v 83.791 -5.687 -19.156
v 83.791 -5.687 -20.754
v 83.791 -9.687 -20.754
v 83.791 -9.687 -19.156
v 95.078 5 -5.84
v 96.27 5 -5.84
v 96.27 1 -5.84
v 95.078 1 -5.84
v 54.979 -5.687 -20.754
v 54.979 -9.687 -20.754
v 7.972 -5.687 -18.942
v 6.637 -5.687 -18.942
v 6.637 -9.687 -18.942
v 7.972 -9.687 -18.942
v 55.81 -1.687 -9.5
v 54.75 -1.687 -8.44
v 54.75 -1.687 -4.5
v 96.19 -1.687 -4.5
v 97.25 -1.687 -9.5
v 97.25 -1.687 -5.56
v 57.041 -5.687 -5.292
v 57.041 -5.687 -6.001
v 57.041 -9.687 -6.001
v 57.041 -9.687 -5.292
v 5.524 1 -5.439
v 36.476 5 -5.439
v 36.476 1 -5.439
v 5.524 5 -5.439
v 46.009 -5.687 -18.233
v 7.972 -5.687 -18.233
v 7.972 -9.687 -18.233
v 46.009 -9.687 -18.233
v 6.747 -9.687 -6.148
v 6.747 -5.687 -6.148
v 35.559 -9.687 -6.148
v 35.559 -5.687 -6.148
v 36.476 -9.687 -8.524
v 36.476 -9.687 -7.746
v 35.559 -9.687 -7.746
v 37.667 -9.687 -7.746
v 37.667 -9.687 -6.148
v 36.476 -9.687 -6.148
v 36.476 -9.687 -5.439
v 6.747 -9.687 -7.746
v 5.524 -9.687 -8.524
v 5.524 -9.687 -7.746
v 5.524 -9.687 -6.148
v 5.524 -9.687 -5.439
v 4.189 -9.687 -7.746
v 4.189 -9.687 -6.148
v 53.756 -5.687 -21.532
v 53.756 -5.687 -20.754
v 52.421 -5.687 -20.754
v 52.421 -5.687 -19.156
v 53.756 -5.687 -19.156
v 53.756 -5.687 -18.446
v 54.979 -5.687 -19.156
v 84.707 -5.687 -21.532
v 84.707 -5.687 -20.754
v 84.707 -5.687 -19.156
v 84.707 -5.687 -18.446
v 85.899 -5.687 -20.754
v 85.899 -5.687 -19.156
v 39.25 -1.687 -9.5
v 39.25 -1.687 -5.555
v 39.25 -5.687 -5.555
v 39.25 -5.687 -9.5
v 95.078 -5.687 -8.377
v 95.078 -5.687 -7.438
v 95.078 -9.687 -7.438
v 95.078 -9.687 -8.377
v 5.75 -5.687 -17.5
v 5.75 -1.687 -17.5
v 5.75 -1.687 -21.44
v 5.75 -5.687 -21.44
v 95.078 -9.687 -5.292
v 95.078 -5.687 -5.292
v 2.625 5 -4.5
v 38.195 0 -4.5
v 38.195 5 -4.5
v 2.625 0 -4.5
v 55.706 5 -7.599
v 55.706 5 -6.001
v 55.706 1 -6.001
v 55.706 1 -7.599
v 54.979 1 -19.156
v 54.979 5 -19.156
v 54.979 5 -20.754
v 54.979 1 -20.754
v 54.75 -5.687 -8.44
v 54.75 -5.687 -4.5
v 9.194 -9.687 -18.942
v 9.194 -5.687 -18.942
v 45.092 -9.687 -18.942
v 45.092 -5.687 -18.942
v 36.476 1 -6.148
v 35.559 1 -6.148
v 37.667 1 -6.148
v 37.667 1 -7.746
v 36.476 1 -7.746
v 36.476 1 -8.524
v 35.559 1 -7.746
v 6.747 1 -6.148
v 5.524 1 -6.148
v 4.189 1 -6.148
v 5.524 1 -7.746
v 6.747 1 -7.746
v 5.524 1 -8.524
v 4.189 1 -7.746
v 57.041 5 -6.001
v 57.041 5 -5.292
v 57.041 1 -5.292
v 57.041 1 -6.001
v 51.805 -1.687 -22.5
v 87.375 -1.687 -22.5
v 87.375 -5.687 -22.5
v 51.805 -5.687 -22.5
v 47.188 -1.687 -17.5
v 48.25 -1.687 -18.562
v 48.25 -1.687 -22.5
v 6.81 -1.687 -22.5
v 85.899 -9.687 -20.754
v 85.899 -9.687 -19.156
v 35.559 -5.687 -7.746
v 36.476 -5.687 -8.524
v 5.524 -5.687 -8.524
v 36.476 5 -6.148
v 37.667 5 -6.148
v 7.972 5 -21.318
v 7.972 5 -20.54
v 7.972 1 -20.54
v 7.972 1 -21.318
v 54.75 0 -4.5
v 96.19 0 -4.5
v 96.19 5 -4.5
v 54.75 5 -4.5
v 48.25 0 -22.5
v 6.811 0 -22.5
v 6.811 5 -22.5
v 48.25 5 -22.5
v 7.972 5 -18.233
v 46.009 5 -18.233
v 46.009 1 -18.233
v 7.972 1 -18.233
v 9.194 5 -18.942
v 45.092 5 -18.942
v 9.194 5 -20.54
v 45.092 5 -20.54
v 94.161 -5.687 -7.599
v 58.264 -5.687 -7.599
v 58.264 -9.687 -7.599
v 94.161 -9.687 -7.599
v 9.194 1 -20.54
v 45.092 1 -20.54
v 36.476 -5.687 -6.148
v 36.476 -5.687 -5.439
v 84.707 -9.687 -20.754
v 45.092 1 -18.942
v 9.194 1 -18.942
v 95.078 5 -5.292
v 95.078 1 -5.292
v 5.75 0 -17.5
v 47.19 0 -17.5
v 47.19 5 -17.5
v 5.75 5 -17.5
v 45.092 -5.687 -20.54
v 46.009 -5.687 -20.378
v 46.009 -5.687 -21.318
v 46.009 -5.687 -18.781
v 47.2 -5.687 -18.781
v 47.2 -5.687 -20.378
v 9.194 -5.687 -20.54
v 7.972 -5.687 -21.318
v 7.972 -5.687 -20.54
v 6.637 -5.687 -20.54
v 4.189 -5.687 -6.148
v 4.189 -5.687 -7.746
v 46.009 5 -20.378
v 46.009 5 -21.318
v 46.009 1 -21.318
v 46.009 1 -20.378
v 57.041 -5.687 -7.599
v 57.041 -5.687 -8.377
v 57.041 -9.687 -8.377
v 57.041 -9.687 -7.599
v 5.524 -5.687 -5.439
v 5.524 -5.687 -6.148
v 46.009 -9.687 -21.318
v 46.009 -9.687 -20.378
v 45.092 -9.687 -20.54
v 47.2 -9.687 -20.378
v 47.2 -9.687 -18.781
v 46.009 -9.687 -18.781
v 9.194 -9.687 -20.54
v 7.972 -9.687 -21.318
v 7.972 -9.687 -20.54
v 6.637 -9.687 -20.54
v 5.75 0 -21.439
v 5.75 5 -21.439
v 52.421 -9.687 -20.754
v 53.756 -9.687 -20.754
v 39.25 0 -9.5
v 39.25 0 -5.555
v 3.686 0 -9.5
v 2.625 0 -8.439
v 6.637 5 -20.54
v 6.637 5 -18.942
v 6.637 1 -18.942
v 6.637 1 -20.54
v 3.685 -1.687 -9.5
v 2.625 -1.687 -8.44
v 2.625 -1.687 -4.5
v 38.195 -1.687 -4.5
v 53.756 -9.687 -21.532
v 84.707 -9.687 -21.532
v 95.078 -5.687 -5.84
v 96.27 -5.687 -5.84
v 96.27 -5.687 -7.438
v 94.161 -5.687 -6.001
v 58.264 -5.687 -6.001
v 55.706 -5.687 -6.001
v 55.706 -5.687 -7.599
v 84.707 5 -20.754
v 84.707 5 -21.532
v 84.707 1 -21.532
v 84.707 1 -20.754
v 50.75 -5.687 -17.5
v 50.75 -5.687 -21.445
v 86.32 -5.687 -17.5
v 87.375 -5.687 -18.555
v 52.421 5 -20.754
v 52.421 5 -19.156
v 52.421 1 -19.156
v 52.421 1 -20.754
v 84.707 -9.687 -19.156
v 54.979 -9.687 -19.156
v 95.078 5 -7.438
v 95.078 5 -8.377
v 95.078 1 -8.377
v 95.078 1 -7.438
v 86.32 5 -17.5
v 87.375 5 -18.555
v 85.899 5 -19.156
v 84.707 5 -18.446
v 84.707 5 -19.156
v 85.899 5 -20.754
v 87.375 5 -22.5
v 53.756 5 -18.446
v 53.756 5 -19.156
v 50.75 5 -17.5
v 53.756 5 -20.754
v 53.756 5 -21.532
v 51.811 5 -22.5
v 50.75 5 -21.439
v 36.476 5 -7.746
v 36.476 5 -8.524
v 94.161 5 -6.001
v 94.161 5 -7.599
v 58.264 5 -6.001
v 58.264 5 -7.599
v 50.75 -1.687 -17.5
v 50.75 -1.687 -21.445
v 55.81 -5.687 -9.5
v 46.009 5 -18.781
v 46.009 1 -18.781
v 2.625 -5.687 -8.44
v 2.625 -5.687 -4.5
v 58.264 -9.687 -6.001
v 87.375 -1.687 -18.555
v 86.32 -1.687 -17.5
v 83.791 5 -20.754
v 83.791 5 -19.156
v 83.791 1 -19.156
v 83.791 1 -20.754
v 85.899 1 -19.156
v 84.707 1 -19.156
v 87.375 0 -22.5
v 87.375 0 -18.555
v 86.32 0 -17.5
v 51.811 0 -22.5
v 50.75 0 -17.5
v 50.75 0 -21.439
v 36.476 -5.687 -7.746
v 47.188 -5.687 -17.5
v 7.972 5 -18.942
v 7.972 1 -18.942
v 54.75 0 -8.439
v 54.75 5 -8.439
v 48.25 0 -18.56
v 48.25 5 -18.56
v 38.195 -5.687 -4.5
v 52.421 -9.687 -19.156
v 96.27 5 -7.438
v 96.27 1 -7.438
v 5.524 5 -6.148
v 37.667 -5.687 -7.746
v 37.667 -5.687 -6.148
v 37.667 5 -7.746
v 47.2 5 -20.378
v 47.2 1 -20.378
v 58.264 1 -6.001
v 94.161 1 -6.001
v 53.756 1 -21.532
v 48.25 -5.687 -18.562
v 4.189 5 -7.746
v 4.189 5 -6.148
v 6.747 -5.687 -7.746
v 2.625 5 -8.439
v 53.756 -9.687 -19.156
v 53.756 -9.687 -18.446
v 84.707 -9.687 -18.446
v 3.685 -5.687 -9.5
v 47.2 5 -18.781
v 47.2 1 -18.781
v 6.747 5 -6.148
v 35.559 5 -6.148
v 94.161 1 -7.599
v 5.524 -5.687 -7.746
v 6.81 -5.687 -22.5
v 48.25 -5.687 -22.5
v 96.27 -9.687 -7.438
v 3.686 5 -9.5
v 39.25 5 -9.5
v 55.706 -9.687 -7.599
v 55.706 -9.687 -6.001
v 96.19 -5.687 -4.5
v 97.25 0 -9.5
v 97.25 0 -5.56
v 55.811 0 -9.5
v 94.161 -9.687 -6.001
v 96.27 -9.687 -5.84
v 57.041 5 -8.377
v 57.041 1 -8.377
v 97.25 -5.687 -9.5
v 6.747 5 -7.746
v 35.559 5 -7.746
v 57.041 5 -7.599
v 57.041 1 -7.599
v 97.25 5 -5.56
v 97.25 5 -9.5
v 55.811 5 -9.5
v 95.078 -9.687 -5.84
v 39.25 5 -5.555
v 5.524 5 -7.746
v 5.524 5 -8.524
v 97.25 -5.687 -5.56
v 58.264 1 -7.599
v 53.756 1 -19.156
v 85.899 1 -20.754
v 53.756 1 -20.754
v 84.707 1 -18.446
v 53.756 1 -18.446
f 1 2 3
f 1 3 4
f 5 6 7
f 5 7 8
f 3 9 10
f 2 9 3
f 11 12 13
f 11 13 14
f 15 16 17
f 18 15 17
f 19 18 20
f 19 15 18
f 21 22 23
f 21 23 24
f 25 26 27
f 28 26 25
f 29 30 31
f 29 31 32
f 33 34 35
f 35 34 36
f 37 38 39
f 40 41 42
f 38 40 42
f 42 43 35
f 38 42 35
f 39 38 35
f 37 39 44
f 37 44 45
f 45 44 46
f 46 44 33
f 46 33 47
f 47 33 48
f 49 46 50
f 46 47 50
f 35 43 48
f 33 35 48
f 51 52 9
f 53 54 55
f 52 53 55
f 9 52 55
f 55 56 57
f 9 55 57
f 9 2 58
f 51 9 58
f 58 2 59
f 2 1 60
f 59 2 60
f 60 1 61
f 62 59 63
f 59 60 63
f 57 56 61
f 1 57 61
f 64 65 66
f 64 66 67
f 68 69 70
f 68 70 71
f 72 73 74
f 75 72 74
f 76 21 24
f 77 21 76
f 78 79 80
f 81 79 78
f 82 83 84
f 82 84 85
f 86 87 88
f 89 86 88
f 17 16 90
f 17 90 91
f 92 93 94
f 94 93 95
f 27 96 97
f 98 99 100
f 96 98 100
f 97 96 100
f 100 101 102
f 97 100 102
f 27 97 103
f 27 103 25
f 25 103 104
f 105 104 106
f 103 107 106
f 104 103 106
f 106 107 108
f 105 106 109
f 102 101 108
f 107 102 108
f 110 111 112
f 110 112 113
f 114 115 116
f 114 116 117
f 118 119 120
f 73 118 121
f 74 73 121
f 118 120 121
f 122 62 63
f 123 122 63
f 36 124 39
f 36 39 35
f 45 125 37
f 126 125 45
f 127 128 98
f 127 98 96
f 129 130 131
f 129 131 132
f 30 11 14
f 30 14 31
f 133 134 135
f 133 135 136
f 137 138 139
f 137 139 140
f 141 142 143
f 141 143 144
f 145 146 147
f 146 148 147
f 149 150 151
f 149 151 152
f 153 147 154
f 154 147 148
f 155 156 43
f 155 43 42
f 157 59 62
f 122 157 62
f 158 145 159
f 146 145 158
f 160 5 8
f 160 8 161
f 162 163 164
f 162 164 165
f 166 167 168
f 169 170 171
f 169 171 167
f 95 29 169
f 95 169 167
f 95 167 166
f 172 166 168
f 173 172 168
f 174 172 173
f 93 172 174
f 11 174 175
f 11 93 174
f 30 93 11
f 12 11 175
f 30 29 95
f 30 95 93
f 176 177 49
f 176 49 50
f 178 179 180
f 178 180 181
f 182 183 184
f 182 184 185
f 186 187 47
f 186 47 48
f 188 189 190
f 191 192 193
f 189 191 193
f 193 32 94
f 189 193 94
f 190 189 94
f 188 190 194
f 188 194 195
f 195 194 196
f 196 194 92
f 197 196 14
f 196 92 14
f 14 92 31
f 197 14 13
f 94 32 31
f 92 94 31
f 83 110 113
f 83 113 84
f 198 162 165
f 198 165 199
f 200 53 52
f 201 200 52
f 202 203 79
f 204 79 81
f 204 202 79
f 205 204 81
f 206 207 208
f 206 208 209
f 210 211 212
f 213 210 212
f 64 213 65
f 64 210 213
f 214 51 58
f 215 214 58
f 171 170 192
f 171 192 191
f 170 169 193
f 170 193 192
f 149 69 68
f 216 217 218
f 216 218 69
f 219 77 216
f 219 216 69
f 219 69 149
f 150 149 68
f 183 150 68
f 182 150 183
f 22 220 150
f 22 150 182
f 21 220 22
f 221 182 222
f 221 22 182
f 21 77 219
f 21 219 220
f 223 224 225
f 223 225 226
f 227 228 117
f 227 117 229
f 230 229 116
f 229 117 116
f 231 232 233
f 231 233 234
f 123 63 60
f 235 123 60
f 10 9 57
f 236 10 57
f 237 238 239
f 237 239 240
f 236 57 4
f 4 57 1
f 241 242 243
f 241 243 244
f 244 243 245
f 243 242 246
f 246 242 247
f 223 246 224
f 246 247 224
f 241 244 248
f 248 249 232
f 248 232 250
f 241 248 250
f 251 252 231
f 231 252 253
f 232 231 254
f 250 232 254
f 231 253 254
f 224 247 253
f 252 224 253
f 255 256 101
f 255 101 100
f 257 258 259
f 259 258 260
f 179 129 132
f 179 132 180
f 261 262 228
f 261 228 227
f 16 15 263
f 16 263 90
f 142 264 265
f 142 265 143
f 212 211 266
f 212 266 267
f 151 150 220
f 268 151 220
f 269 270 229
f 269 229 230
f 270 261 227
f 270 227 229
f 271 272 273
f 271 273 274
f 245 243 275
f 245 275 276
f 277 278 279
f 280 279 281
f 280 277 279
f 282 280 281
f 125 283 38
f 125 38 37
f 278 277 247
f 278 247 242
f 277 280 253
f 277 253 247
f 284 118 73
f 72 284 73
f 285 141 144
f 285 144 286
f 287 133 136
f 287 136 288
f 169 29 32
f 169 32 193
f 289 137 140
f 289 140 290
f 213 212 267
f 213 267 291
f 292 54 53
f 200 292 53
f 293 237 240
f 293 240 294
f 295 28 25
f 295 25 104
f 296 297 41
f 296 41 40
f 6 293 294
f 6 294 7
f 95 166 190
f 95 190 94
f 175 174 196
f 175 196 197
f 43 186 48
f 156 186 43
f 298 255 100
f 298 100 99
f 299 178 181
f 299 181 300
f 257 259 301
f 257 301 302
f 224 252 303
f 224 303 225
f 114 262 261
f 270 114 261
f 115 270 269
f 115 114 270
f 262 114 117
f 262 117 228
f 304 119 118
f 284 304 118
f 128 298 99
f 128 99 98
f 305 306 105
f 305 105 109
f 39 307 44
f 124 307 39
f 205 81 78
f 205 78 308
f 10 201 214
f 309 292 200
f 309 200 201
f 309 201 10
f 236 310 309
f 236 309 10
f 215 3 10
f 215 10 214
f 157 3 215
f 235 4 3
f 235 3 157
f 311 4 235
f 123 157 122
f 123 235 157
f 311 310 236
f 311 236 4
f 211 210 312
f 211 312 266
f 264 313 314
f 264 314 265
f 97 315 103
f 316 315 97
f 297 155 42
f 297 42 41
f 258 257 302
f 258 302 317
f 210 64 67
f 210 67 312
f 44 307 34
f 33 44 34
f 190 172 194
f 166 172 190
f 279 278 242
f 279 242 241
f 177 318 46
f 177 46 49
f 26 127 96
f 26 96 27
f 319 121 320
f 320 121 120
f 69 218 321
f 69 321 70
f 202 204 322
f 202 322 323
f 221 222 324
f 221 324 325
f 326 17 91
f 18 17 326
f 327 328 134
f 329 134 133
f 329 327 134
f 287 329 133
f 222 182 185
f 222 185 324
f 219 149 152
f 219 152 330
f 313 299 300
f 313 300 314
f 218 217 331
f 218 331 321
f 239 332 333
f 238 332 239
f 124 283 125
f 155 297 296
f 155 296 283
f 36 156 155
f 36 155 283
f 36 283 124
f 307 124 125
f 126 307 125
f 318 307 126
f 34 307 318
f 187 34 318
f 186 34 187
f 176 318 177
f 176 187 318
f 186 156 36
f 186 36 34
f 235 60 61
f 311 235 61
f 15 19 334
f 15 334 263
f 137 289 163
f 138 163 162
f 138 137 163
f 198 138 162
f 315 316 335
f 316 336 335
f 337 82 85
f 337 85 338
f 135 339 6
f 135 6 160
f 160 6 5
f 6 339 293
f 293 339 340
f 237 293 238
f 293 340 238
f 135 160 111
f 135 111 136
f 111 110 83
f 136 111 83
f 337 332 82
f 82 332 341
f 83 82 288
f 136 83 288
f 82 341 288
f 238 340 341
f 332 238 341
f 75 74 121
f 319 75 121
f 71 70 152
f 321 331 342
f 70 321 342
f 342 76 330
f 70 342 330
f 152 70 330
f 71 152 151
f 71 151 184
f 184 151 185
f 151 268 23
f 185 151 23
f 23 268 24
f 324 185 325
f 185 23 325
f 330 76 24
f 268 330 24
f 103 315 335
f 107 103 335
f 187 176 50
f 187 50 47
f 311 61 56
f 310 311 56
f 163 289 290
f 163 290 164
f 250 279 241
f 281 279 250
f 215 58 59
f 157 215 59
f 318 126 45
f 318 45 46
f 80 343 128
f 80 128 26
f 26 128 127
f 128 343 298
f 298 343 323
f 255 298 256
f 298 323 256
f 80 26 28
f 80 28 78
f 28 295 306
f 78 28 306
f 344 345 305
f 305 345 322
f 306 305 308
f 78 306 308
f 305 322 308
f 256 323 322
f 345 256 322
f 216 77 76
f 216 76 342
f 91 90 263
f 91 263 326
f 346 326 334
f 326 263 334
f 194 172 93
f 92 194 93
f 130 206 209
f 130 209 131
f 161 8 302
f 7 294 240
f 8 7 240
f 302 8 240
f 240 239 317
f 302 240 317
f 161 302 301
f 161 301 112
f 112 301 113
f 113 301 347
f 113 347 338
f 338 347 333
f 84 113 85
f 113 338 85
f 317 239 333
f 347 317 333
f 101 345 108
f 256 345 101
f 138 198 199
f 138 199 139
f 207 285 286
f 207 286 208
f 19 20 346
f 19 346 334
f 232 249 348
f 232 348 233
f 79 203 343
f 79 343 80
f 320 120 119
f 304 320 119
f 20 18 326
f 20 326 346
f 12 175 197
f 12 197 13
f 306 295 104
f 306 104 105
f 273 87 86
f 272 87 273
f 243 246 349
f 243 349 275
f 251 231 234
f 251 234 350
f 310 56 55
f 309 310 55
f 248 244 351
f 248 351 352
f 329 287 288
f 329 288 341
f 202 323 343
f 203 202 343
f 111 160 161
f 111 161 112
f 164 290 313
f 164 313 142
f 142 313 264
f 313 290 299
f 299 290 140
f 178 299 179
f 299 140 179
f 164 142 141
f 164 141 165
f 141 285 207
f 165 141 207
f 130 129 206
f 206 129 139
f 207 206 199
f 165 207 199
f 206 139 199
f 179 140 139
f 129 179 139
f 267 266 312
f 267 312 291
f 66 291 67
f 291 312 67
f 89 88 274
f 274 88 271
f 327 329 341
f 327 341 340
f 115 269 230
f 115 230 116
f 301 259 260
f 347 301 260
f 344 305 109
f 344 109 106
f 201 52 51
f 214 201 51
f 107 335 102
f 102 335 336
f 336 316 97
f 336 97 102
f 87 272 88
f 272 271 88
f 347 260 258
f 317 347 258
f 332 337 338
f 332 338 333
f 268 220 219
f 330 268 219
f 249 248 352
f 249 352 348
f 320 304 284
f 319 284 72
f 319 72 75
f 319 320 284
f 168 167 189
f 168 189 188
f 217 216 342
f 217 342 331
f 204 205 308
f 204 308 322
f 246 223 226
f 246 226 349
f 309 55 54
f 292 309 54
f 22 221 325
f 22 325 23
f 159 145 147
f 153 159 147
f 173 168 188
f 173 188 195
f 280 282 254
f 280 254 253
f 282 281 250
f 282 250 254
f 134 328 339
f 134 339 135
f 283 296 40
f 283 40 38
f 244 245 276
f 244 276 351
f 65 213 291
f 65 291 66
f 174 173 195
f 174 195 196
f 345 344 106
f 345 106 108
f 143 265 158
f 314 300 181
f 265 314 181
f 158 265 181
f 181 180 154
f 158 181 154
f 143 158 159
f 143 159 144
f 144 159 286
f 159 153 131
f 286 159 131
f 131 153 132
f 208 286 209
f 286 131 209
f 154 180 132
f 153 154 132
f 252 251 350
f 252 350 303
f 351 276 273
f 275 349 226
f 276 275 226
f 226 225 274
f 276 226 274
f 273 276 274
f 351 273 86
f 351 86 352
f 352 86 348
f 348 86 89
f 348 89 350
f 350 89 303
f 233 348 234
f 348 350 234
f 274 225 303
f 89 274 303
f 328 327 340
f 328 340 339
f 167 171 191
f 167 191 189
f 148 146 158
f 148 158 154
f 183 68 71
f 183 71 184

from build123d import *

# Parameters (mm, degrees)
SV_DEPTH           = 5
SV_2_DEPTH         = 5
SV_3_DEPTH         = 5
SV_4_DEPTH         = 5
SKETCH3_W          = 28.811718275
SKETCH3_H          = 1.597828601
SKETCH3_W_2        = 35.897762959
SKETCH3_W_3        = 35.897762958
CUT_EXTRUDE1_DEPTH = 4
SV4_A_DEPTH        = 4
SV4_A_2_DEPTH      = 4
SV4_A_3_DEPTH      = 4
SV4_A_4_DEPTH      = 4
SKETCH7_W          = 35.897762958
SKETCH7_H          = 1.597828601
SV4_B_DEPTH        = 4
SKETCH7_W_2        = 28.811718275
SV4_B_2_DEPTH      = 4
SKETCH7_W_3        = 35.897762959
SV4_B_3_DEPTH      = 4
SV4_B_4_DEPTH      = 4


with BuildPart() as part:
    # Sketch1 → SV (new body)
    with BuildSketch(Plane(origin=(0, 0, 0), x_dir=(1, 0, 0), z_dir=(0, 1, 0))):
        Polygon((55.811, 9.5), (97.25, 9.5), (97.25, 5.56), (96.19, 4.5), (54.75, 4.5), (54.75, 8.439), align=None)
    extrude(amount=SV_DEPTH)


with BuildPart() as body_2:
    # Sketch1 → SV 2 (new body)
    with BuildSketch(Plane(origin=(0, 0, 0), x_dir=(1, 0, 0), z_dir=(0, 1, 0))):
        Polygon((3.686, 9.5), (39.25, 9.5), (39.25, 5.555), (38.195, 4.5), (2.625, 4.5), (2.625, 8.439), align=None)
    extrude(amount=SV_2_DEPTH)


with BuildPart() as body_3:
    # Sketch1 → SV 3 (new body)
    with BuildSketch(Plane(origin=(0, 0, 0), x_dir=(1, 0, 0), z_dir=(0, 1, 0))):
        Polygon((51.811, 22.5), (87.375, 22.5), (87.375, 18.555), (86.32, 17.5), (50.75, 17.5), (50.75, 21.439), align=None)
    extrude(amount=SV_3_DEPTH)


with BuildPart() as body_4:
    # Sketch1 → SV 4 (new body)
    with BuildSketch(Plane(origin=(0, 0, 0), x_dir=(1, 0, 0), z_dir=(0, 1, 0))):
        Polygon((6.811, 22.5), (48.25, 22.5), (48.25, 18.56), (47.19, 17.5), (5.75, 17.5), (5.75, 21.439), align=None)
    extrude(amount=SV_4_DEPTH)


with BuildPart() as cut_extrude1_tool:
    # Sketch3 → Cut-Extrude1 (new body)
    with BuildSketch(Plane(origin=(0, 5, 0), x_dir=(1, 0, 0), z_dir=(0, 1, 0))):
        Polygon((4.189336253, 7.745735487), (5.524337048, 7.745735487), (5.524337048, 8.524173538), (36.475691419, 8.524173538), (36.475691419, 7.745735487), (37.666991912, 7.745735487), (37.666991912, 6.147906886), (36.475691419, 6.147906886), (36.475691419, 5.438560322), (5.524337048, 5.438560322), (5.524337048, 6.147906886), (4.189336253, 6.147906886), align=None)
        with Locations((21.152985591, 6.946821187)):
            Rectangle(SKETCH3_W, SKETCH3_H, mode=Mode.SUBTRACT)
        Polygon((52.421116037, 20.753597434), (53.756116831, 20.753597434), (53.756116831, 21.532035485), (84.707471203, 21.532035485), (84.707471203, 20.753597434), (85.898771695, 20.753597434), (85.898771695, 19.155768833), (84.707471203, 19.155768833), (84.707471203, 18.446422269), (53.756116831, 18.446422269), (53.756116831, 19.155768833), (52.421116037, 19.155768833), align=None)
        with Locations((69.384765375, 19.954683133)):
            Rectangle(SKETCH3_W, SKETCH3_H, mode=Mode.SUBTRACT)
        Polygon((55.705906871, 7.599031898), (57.040907666, 7.599031898), (57.040907666, 8.377469948), (95.07830672, 8.377469948), (95.07830672, 7.437727621), (96.269607213, 7.437727621), (96.269607213, 5.83989902), (95.07830672, 5.83989902), (95.07830672, 5.291856733), (57.040907666, 5.291856733), (57.040907666, 6.001203297), (55.705906871, 6.001203297), align=None)
        with Locations((76.21257855, 6.800117597)):
            Rectangle(SKETCH3_W_2, SKETCH3_H, mode=Mode.SUBTRACT)
        Polygon((6.636601859, 20.53972103), (7.971602653, 20.53972103), (7.971602653, 21.318159081), (46.009001708, 21.318159081), (46.009001708, 20.378416754), (47.2003022, 20.378416754), (47.2003022, 18.780588153), (46.009001708, 18.780588153), (46.009001708, 18.232545866), (7.971602653, 18.232545866), (7.971602653, 18.941892429), (6.636601859, 18.941892429), align=None)
        with Locations((27.143273538, 19.74080673)):
            Rectangle(SKETCH3_W_3, SKETCH3_H, mode=Mode.SUBTRACT)
    extrude(amount=-CUT_EXTRUDE1_DEPTH)


with BuildPart() as part_1:
    add(part.part)

    # Cut-Extrude1: cut by cut_extrude1_tool
    add(cut_extrude1_tool.part, mode=Mode.SUBTRACT)


with BuildPart() as body_2_1:
    add(body_2.part)

    # Cut-Extrude1: cut by cut_extrude1_tool
    add(cut_extrude1_tool.part, mode=Mode.SUBTRACT)


with BuildPart() as body_3_1:
    add(body_3.part)

    # Cut-Extrude1: cut by cut_extrude1_tool
    add(cut_extrude1_tool.part, mode=Mode.SUBTRACT)


with BuildPart() as body_4_1:
    add(body_4.part)

    # Cut-Extrude1: cut by cut_extrude1_tool
    add(cut_extrude1_tool.part, mode=Mode.SUBTRACT)


with BuildPart() as body_5:
    # Sketch6 → SV4(a) (new body)
    with BuildSketch(Plane(origin=(0, -1.68656, 0), x_dir=(1, 0, 0), z_dir=(0, 1, 0))):
        Polygon((2.625, 4.5), (38.195, 4.5), (39.25, 5.555), (39.25, 9.5), (3.685, 9.5), (2.625, 8.44), align=None)
    extrude(amount=-SV4_A_DEPTH)


with BuildPart() as body_6:
    # Sketch6 → SV4_a 2 (new body)
    with BuildSketch(Plane(origin=(0, -1.68656, 0), x_dir=(1, 0, 0), z_dir=(0, 1, 0))):
        Polygon((48.25, 18.56191605), (47.18808395, 17.5), (5.75, 17.5), (5.75, 21.44), (6.81, 22.5), (48.25, 22.5), align=None)
    extrude(amount=-SV4_A_2_DEPTH)


with BuildPart() as body_7:
    # Sketch6 → SV4_a 3 (new body)
    with BuildSketch(Plane(origin=(0, -1.68656, 0), x_dir=(1, 0, 0), z_dir=(0, 1, 0))):
        Polygon((54.75, 4.5), (96.19, 4.5), (97.25, 5.56), (97.25, 9.5), (55.81, 9.5), (54.75, 8.44), align=None)
    extrude(amount=-SV4_A_3_DEPTH)


with BuildPart() as body_8:
    # Sketch6 → SV4_a 4 (new body)
    with BuildSketch(Plane(origin=(0, -1.68656, 0), x_dir=(1, 0, 0), z_dir=(0, 1, 0))):
        Polygon((50.75, 17.5), (86.32, 17.5), (87.375, 18.555), (87.375, 22.5), (51.805, 22.5), (50.75, 21.445), align=None)
    extrude(amount=-SV4_A_4_DEPTH)


with BuildPart() as body_9:
    # Sketch7 → SV4(b) (new body)
    with BuildSketch(Plane.XZ.offset(5.68656)):
        Polygon((7.971602653, -21.318159081), (7.971602653, -20.53972103), (6.636601859, -20.53972103), (6.636601859, -18.941892429), (7.971602653, -18.941892429), (7.971602653, -18.232545866), (46.009001708, -18.232545866), (46.009001708, -18.780588153), (47.2003022, -18.780588153), (47.2003022, -20.378416754), (46.009001708, -20.378416754), (46.009001708, -21.318159081), align=None)
        with Locations((27.143273538, -19.74080673)):
            Rectangle(SKETCH7_W, SKETCH7_H, mode=Mode.SUBTRACT)
    extrude(amount=SV4_B_DEPTH)


with BuildPart() as body_10:
    # Sketch7 → SV4_b 2 (new body)
    with BuildSketch(Plane.XZ.offset(5.68656)):
        Polygon((53.756116831, -21.532035485), (84.707471203, -21.532035485), (84.707471203, -20.753597434), (85.898771695, -20.753597434), (85.898771695, -19.155768833), (84.707471203, -19.155768833), (84.707471203, -18.446422269), (53.756116831, -18.446422269), (53.756116831, -19.155768833), (52.421116037, -19.155768833), (52.421116037, -20.753597434), (53.756116831, -20.753597434), align=None)
        with Locations((69.384765375, -19.954683133)):
            Rectangle(SKETCH7_W_2, SKETCH7_H, mode=Mode.SUBTRACT)
    extrude(amount=SV4_B_2_DEPTH)


with BuildPart() as body_11:
    # Sketch7 → SV4_b 3 (new body)
    with BuildSketch(Plane.XZ.offset(5.68656)):
        Polygon((57.040907666, -8.377469948), (57.040907666, -7.599031898), (55.705906871, -7.599031898), (55.705906871, -6.001203297), (57.040907666, -6.001203297), (57.040907666, -5.291856733), (95.07830672, -5.291856733), (95.07830672, -5.83989902), (96.269607213, -5.83989902), (96.269607213, -7.437727621), (95.07830672, -7.437727621), (95.07830672, -8.377469948), align=None)
        with Locations((76.21257855, -6.800117597)):
            Rectangle(SKETCH7_W_3, SKETCH7_H, mode=Mode.SUBTRACT)
    extrude(amount=SV4_B_3_DEPTH)


with BuildPart() as body_12:
    # Sketch7 → SV4_b 4 (new body)
    with BuildSketch(Plane.XZ.offset(5.68656)):
        Polygon((4.189336253, -6.147906886), (5.524337048, -6.147906886), (5.524337048, -5.438560322), (36.475691419, -5.438560322), (36.475691419, -6.147906886), (37.666991912, -6.147906886), (37.666991912, -7.745735487), (36.475691419, -7.745735487), (36.475691419, -8.524173538), (5.524337048, -8.524173538), (5.524337048, -7.745735487), (4.189336253, -7.745735487), align=None)
        with Locations((21.152985591, -6.946821187)):
            Rectangle(SKETCH7_W_2, SKETCH7_H, mode=Mode.SUBTRACT)
    extrude(amount=SV4_B_4_DEPTH)


solid = Compound([part_1.part, body_2_1.part, body_3_1.part, body_4_1.part, body_5.part, body_6.part, body_7.part, body_8.part, body_9.part, body_10.part, body_11.part, body_12.part])
